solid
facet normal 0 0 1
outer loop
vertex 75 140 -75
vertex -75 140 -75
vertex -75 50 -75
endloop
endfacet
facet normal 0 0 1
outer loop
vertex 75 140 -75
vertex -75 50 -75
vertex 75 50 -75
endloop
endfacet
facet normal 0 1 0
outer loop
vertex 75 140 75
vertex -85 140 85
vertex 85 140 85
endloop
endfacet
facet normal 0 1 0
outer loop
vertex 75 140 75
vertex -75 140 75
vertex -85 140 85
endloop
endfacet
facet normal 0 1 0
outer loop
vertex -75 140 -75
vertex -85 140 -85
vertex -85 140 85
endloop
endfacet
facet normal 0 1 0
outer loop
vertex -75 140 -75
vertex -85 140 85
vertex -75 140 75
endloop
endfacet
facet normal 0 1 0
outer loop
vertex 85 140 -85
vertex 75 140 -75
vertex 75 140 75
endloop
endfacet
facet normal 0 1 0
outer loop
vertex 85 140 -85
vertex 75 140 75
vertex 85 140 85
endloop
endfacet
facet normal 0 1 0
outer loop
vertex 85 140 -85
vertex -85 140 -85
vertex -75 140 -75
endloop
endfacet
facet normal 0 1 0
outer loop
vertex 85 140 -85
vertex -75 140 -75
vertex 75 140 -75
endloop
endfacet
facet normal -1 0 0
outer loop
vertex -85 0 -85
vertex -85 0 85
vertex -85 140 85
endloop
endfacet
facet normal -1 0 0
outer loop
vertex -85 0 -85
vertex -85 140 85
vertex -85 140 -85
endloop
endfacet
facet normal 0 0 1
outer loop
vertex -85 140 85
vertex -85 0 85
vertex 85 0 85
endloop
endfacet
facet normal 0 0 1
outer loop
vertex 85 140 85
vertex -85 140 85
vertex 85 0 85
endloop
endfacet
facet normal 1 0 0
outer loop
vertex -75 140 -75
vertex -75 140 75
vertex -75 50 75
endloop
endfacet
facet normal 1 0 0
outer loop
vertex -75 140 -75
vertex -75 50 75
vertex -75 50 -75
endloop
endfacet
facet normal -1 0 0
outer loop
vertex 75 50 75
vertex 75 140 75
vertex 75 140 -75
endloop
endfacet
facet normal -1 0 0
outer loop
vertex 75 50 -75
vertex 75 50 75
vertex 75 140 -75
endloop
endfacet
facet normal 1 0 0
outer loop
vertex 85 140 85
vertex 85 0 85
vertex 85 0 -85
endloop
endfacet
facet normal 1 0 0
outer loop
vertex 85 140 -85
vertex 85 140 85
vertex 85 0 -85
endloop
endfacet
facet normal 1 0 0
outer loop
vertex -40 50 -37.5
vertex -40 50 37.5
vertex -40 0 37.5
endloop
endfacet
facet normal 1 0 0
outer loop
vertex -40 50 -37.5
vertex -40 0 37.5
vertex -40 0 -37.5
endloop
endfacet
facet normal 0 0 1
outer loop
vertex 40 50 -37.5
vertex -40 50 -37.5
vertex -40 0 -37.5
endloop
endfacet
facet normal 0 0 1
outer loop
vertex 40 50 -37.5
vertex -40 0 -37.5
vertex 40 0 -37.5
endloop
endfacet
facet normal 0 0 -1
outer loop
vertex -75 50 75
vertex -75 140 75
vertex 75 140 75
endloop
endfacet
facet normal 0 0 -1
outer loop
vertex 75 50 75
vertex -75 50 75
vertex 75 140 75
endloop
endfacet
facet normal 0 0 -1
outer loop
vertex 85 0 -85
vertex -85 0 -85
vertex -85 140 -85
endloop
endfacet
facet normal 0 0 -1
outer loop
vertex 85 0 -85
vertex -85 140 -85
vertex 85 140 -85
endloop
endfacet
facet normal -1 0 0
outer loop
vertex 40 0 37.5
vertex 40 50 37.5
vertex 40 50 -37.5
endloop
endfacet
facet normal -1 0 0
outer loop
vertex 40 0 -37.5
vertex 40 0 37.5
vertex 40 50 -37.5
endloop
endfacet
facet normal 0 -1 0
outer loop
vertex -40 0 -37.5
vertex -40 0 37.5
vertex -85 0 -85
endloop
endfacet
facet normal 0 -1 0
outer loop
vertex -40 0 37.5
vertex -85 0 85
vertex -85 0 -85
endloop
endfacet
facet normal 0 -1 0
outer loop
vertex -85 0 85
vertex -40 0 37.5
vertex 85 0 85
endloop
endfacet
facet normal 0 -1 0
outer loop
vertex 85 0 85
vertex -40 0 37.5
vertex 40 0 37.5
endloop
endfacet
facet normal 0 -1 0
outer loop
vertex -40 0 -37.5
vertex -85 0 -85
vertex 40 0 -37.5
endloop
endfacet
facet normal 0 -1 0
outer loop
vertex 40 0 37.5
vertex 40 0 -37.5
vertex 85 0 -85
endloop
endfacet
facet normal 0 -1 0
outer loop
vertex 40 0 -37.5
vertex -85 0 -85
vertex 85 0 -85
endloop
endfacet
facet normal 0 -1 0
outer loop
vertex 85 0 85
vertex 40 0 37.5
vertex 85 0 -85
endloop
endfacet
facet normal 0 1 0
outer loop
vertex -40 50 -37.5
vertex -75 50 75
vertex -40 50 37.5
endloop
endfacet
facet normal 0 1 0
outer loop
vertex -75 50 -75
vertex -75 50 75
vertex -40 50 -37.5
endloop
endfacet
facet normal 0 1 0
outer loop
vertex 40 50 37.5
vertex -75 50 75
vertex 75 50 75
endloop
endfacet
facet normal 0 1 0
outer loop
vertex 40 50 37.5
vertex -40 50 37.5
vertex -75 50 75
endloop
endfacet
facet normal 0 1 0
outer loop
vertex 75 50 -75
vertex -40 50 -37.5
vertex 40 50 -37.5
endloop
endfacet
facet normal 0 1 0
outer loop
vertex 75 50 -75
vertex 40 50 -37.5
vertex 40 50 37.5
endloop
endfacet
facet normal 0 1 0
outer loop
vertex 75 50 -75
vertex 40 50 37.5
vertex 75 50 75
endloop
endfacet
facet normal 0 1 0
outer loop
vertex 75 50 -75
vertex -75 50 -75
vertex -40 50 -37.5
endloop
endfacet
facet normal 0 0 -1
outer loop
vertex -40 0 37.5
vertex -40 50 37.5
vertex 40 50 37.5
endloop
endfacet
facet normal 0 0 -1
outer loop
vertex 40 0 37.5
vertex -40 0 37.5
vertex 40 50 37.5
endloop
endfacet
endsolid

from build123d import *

# Parameters (mm, degrees)
SKETCH_2_W          = 170
SKETCH_2_H          = 170
EXTRUDE_1_DEPTH     = 140
SKETCH_3_W          = 150
SKETCH_3_H          = 150
CUT_EXTRUDE_1_DEPTH = 90
CUT_EXTRUDE_2_REACH = 152.167
SKETCH_4_W          = 80
SKETCH_4_H          = 75


with BuildPart() as part:
    # Эскиз2 → Бобышка-Вытянуть1 (new body)
    with BuildSketch(Plane(origin=(0, 0, 0), x_dir=(1, 0, 0), z_dir=(0, 1, 0))):
        Rectangle(SKETCH_2_W, SKETCH_2_H)
    extrude(amount=EXTRUDE_1_DEPTH)

    # Эскиз3 → Вырез-Вытянуть1 (cut)
    with BuildSketch(Plane(origin=(0, 140, 0), x_dir=(1, 0, 0), z_dir=(0, 1, 0))):
        Rectangle(SKETCH_3_W, SKETCH_3_H)
    extrude(amount=-CUT_EXTRUDE_1_DEPTH, mode=Mode.SUBTRACT)

    # Эскиз4 → Вырез-Вытянуть2 (cut, up to next)
    with BuildSketch(Plane(origin=(0, 50, 0), x_dir=(1, 0, 0), z_dir=(0, 1, 0)), mode=Mode.PRIVATE) as cut_extrude_2_sk1:
        Rectangle(SKETCH_4_W, SKETCH_4_H)
    cut_extrude_2_tool1 = extrude(cut_extrude_2_sk1.sketch, amount=-CUT_EXTRUDE_2_REACH, mode=Mode.PRIVATE) & part.part
    add(cut_extrude_2_tool1.solids().sort_by_distance((0, 50, 0))[0], mode=Mode.SUBTRACT)


solid = part.part
